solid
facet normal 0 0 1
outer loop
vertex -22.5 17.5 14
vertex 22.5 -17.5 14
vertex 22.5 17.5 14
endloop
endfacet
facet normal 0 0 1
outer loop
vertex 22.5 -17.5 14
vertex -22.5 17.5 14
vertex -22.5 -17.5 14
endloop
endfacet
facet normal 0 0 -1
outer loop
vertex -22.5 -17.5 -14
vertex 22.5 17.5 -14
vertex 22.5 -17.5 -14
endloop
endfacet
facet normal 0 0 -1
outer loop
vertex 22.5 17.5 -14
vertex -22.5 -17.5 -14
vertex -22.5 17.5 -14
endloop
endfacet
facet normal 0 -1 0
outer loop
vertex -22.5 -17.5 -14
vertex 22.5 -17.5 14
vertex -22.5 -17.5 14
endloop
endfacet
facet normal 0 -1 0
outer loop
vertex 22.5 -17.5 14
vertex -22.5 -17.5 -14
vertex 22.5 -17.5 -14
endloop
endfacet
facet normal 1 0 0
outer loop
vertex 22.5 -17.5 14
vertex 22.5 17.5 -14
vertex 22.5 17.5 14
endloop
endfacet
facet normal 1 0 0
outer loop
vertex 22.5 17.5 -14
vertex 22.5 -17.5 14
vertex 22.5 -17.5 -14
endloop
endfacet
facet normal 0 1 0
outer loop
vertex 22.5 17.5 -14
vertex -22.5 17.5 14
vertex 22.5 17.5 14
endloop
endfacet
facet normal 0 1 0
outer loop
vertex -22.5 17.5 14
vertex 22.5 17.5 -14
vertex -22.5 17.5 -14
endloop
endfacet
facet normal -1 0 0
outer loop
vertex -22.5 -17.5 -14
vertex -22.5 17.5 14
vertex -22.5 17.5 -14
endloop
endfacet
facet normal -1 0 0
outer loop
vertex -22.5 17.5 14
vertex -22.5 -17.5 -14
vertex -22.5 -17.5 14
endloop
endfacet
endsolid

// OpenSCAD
/**
 * Library Test Example
 * Demonstrates using OpenSCAD library bundles (MCAD)
 * @license CC0-1.0 (Public Domain)
 */

// This example uses MCAD library for rounded boxes
use <MCAD/boxes.scad>;

/*[Dimensions]*/
// Box width (mm)
width = 45; // [20:100]

// Box depth (mm)
depth = 35; // [20:100]

// Box height (mm)
height = 28; // [10:50]

// Corner radius (mm)
radius = 4; // [1:15]

/*[Options]*/
// Box style
style = "Simple"; // [Simple, Rounded]

/*[Hidden]*/
// Fragment number for curves
$fn = 64;

/*[Style Options]*/
// Round only the sides (faster) or all edges including top/bottom
sidesonly = true; // [true, false]

// Main module
module main() {
    if (style == "Rounded") {
        // Use MCAD's rounded box function
        // roundedBox(size, radius, sidesonly)
        // - size: [x, y, z] dimensions
        // - radius: corner radius
        // - sidesonly: true = round only vertical edges, false = round all edges
        roundedBox([width, depth, height], radius, sidesonly);
    } else {
        // Simple cube for comparison
        cube([width, depth, height], center=true);
    }
}

// Render
main();
